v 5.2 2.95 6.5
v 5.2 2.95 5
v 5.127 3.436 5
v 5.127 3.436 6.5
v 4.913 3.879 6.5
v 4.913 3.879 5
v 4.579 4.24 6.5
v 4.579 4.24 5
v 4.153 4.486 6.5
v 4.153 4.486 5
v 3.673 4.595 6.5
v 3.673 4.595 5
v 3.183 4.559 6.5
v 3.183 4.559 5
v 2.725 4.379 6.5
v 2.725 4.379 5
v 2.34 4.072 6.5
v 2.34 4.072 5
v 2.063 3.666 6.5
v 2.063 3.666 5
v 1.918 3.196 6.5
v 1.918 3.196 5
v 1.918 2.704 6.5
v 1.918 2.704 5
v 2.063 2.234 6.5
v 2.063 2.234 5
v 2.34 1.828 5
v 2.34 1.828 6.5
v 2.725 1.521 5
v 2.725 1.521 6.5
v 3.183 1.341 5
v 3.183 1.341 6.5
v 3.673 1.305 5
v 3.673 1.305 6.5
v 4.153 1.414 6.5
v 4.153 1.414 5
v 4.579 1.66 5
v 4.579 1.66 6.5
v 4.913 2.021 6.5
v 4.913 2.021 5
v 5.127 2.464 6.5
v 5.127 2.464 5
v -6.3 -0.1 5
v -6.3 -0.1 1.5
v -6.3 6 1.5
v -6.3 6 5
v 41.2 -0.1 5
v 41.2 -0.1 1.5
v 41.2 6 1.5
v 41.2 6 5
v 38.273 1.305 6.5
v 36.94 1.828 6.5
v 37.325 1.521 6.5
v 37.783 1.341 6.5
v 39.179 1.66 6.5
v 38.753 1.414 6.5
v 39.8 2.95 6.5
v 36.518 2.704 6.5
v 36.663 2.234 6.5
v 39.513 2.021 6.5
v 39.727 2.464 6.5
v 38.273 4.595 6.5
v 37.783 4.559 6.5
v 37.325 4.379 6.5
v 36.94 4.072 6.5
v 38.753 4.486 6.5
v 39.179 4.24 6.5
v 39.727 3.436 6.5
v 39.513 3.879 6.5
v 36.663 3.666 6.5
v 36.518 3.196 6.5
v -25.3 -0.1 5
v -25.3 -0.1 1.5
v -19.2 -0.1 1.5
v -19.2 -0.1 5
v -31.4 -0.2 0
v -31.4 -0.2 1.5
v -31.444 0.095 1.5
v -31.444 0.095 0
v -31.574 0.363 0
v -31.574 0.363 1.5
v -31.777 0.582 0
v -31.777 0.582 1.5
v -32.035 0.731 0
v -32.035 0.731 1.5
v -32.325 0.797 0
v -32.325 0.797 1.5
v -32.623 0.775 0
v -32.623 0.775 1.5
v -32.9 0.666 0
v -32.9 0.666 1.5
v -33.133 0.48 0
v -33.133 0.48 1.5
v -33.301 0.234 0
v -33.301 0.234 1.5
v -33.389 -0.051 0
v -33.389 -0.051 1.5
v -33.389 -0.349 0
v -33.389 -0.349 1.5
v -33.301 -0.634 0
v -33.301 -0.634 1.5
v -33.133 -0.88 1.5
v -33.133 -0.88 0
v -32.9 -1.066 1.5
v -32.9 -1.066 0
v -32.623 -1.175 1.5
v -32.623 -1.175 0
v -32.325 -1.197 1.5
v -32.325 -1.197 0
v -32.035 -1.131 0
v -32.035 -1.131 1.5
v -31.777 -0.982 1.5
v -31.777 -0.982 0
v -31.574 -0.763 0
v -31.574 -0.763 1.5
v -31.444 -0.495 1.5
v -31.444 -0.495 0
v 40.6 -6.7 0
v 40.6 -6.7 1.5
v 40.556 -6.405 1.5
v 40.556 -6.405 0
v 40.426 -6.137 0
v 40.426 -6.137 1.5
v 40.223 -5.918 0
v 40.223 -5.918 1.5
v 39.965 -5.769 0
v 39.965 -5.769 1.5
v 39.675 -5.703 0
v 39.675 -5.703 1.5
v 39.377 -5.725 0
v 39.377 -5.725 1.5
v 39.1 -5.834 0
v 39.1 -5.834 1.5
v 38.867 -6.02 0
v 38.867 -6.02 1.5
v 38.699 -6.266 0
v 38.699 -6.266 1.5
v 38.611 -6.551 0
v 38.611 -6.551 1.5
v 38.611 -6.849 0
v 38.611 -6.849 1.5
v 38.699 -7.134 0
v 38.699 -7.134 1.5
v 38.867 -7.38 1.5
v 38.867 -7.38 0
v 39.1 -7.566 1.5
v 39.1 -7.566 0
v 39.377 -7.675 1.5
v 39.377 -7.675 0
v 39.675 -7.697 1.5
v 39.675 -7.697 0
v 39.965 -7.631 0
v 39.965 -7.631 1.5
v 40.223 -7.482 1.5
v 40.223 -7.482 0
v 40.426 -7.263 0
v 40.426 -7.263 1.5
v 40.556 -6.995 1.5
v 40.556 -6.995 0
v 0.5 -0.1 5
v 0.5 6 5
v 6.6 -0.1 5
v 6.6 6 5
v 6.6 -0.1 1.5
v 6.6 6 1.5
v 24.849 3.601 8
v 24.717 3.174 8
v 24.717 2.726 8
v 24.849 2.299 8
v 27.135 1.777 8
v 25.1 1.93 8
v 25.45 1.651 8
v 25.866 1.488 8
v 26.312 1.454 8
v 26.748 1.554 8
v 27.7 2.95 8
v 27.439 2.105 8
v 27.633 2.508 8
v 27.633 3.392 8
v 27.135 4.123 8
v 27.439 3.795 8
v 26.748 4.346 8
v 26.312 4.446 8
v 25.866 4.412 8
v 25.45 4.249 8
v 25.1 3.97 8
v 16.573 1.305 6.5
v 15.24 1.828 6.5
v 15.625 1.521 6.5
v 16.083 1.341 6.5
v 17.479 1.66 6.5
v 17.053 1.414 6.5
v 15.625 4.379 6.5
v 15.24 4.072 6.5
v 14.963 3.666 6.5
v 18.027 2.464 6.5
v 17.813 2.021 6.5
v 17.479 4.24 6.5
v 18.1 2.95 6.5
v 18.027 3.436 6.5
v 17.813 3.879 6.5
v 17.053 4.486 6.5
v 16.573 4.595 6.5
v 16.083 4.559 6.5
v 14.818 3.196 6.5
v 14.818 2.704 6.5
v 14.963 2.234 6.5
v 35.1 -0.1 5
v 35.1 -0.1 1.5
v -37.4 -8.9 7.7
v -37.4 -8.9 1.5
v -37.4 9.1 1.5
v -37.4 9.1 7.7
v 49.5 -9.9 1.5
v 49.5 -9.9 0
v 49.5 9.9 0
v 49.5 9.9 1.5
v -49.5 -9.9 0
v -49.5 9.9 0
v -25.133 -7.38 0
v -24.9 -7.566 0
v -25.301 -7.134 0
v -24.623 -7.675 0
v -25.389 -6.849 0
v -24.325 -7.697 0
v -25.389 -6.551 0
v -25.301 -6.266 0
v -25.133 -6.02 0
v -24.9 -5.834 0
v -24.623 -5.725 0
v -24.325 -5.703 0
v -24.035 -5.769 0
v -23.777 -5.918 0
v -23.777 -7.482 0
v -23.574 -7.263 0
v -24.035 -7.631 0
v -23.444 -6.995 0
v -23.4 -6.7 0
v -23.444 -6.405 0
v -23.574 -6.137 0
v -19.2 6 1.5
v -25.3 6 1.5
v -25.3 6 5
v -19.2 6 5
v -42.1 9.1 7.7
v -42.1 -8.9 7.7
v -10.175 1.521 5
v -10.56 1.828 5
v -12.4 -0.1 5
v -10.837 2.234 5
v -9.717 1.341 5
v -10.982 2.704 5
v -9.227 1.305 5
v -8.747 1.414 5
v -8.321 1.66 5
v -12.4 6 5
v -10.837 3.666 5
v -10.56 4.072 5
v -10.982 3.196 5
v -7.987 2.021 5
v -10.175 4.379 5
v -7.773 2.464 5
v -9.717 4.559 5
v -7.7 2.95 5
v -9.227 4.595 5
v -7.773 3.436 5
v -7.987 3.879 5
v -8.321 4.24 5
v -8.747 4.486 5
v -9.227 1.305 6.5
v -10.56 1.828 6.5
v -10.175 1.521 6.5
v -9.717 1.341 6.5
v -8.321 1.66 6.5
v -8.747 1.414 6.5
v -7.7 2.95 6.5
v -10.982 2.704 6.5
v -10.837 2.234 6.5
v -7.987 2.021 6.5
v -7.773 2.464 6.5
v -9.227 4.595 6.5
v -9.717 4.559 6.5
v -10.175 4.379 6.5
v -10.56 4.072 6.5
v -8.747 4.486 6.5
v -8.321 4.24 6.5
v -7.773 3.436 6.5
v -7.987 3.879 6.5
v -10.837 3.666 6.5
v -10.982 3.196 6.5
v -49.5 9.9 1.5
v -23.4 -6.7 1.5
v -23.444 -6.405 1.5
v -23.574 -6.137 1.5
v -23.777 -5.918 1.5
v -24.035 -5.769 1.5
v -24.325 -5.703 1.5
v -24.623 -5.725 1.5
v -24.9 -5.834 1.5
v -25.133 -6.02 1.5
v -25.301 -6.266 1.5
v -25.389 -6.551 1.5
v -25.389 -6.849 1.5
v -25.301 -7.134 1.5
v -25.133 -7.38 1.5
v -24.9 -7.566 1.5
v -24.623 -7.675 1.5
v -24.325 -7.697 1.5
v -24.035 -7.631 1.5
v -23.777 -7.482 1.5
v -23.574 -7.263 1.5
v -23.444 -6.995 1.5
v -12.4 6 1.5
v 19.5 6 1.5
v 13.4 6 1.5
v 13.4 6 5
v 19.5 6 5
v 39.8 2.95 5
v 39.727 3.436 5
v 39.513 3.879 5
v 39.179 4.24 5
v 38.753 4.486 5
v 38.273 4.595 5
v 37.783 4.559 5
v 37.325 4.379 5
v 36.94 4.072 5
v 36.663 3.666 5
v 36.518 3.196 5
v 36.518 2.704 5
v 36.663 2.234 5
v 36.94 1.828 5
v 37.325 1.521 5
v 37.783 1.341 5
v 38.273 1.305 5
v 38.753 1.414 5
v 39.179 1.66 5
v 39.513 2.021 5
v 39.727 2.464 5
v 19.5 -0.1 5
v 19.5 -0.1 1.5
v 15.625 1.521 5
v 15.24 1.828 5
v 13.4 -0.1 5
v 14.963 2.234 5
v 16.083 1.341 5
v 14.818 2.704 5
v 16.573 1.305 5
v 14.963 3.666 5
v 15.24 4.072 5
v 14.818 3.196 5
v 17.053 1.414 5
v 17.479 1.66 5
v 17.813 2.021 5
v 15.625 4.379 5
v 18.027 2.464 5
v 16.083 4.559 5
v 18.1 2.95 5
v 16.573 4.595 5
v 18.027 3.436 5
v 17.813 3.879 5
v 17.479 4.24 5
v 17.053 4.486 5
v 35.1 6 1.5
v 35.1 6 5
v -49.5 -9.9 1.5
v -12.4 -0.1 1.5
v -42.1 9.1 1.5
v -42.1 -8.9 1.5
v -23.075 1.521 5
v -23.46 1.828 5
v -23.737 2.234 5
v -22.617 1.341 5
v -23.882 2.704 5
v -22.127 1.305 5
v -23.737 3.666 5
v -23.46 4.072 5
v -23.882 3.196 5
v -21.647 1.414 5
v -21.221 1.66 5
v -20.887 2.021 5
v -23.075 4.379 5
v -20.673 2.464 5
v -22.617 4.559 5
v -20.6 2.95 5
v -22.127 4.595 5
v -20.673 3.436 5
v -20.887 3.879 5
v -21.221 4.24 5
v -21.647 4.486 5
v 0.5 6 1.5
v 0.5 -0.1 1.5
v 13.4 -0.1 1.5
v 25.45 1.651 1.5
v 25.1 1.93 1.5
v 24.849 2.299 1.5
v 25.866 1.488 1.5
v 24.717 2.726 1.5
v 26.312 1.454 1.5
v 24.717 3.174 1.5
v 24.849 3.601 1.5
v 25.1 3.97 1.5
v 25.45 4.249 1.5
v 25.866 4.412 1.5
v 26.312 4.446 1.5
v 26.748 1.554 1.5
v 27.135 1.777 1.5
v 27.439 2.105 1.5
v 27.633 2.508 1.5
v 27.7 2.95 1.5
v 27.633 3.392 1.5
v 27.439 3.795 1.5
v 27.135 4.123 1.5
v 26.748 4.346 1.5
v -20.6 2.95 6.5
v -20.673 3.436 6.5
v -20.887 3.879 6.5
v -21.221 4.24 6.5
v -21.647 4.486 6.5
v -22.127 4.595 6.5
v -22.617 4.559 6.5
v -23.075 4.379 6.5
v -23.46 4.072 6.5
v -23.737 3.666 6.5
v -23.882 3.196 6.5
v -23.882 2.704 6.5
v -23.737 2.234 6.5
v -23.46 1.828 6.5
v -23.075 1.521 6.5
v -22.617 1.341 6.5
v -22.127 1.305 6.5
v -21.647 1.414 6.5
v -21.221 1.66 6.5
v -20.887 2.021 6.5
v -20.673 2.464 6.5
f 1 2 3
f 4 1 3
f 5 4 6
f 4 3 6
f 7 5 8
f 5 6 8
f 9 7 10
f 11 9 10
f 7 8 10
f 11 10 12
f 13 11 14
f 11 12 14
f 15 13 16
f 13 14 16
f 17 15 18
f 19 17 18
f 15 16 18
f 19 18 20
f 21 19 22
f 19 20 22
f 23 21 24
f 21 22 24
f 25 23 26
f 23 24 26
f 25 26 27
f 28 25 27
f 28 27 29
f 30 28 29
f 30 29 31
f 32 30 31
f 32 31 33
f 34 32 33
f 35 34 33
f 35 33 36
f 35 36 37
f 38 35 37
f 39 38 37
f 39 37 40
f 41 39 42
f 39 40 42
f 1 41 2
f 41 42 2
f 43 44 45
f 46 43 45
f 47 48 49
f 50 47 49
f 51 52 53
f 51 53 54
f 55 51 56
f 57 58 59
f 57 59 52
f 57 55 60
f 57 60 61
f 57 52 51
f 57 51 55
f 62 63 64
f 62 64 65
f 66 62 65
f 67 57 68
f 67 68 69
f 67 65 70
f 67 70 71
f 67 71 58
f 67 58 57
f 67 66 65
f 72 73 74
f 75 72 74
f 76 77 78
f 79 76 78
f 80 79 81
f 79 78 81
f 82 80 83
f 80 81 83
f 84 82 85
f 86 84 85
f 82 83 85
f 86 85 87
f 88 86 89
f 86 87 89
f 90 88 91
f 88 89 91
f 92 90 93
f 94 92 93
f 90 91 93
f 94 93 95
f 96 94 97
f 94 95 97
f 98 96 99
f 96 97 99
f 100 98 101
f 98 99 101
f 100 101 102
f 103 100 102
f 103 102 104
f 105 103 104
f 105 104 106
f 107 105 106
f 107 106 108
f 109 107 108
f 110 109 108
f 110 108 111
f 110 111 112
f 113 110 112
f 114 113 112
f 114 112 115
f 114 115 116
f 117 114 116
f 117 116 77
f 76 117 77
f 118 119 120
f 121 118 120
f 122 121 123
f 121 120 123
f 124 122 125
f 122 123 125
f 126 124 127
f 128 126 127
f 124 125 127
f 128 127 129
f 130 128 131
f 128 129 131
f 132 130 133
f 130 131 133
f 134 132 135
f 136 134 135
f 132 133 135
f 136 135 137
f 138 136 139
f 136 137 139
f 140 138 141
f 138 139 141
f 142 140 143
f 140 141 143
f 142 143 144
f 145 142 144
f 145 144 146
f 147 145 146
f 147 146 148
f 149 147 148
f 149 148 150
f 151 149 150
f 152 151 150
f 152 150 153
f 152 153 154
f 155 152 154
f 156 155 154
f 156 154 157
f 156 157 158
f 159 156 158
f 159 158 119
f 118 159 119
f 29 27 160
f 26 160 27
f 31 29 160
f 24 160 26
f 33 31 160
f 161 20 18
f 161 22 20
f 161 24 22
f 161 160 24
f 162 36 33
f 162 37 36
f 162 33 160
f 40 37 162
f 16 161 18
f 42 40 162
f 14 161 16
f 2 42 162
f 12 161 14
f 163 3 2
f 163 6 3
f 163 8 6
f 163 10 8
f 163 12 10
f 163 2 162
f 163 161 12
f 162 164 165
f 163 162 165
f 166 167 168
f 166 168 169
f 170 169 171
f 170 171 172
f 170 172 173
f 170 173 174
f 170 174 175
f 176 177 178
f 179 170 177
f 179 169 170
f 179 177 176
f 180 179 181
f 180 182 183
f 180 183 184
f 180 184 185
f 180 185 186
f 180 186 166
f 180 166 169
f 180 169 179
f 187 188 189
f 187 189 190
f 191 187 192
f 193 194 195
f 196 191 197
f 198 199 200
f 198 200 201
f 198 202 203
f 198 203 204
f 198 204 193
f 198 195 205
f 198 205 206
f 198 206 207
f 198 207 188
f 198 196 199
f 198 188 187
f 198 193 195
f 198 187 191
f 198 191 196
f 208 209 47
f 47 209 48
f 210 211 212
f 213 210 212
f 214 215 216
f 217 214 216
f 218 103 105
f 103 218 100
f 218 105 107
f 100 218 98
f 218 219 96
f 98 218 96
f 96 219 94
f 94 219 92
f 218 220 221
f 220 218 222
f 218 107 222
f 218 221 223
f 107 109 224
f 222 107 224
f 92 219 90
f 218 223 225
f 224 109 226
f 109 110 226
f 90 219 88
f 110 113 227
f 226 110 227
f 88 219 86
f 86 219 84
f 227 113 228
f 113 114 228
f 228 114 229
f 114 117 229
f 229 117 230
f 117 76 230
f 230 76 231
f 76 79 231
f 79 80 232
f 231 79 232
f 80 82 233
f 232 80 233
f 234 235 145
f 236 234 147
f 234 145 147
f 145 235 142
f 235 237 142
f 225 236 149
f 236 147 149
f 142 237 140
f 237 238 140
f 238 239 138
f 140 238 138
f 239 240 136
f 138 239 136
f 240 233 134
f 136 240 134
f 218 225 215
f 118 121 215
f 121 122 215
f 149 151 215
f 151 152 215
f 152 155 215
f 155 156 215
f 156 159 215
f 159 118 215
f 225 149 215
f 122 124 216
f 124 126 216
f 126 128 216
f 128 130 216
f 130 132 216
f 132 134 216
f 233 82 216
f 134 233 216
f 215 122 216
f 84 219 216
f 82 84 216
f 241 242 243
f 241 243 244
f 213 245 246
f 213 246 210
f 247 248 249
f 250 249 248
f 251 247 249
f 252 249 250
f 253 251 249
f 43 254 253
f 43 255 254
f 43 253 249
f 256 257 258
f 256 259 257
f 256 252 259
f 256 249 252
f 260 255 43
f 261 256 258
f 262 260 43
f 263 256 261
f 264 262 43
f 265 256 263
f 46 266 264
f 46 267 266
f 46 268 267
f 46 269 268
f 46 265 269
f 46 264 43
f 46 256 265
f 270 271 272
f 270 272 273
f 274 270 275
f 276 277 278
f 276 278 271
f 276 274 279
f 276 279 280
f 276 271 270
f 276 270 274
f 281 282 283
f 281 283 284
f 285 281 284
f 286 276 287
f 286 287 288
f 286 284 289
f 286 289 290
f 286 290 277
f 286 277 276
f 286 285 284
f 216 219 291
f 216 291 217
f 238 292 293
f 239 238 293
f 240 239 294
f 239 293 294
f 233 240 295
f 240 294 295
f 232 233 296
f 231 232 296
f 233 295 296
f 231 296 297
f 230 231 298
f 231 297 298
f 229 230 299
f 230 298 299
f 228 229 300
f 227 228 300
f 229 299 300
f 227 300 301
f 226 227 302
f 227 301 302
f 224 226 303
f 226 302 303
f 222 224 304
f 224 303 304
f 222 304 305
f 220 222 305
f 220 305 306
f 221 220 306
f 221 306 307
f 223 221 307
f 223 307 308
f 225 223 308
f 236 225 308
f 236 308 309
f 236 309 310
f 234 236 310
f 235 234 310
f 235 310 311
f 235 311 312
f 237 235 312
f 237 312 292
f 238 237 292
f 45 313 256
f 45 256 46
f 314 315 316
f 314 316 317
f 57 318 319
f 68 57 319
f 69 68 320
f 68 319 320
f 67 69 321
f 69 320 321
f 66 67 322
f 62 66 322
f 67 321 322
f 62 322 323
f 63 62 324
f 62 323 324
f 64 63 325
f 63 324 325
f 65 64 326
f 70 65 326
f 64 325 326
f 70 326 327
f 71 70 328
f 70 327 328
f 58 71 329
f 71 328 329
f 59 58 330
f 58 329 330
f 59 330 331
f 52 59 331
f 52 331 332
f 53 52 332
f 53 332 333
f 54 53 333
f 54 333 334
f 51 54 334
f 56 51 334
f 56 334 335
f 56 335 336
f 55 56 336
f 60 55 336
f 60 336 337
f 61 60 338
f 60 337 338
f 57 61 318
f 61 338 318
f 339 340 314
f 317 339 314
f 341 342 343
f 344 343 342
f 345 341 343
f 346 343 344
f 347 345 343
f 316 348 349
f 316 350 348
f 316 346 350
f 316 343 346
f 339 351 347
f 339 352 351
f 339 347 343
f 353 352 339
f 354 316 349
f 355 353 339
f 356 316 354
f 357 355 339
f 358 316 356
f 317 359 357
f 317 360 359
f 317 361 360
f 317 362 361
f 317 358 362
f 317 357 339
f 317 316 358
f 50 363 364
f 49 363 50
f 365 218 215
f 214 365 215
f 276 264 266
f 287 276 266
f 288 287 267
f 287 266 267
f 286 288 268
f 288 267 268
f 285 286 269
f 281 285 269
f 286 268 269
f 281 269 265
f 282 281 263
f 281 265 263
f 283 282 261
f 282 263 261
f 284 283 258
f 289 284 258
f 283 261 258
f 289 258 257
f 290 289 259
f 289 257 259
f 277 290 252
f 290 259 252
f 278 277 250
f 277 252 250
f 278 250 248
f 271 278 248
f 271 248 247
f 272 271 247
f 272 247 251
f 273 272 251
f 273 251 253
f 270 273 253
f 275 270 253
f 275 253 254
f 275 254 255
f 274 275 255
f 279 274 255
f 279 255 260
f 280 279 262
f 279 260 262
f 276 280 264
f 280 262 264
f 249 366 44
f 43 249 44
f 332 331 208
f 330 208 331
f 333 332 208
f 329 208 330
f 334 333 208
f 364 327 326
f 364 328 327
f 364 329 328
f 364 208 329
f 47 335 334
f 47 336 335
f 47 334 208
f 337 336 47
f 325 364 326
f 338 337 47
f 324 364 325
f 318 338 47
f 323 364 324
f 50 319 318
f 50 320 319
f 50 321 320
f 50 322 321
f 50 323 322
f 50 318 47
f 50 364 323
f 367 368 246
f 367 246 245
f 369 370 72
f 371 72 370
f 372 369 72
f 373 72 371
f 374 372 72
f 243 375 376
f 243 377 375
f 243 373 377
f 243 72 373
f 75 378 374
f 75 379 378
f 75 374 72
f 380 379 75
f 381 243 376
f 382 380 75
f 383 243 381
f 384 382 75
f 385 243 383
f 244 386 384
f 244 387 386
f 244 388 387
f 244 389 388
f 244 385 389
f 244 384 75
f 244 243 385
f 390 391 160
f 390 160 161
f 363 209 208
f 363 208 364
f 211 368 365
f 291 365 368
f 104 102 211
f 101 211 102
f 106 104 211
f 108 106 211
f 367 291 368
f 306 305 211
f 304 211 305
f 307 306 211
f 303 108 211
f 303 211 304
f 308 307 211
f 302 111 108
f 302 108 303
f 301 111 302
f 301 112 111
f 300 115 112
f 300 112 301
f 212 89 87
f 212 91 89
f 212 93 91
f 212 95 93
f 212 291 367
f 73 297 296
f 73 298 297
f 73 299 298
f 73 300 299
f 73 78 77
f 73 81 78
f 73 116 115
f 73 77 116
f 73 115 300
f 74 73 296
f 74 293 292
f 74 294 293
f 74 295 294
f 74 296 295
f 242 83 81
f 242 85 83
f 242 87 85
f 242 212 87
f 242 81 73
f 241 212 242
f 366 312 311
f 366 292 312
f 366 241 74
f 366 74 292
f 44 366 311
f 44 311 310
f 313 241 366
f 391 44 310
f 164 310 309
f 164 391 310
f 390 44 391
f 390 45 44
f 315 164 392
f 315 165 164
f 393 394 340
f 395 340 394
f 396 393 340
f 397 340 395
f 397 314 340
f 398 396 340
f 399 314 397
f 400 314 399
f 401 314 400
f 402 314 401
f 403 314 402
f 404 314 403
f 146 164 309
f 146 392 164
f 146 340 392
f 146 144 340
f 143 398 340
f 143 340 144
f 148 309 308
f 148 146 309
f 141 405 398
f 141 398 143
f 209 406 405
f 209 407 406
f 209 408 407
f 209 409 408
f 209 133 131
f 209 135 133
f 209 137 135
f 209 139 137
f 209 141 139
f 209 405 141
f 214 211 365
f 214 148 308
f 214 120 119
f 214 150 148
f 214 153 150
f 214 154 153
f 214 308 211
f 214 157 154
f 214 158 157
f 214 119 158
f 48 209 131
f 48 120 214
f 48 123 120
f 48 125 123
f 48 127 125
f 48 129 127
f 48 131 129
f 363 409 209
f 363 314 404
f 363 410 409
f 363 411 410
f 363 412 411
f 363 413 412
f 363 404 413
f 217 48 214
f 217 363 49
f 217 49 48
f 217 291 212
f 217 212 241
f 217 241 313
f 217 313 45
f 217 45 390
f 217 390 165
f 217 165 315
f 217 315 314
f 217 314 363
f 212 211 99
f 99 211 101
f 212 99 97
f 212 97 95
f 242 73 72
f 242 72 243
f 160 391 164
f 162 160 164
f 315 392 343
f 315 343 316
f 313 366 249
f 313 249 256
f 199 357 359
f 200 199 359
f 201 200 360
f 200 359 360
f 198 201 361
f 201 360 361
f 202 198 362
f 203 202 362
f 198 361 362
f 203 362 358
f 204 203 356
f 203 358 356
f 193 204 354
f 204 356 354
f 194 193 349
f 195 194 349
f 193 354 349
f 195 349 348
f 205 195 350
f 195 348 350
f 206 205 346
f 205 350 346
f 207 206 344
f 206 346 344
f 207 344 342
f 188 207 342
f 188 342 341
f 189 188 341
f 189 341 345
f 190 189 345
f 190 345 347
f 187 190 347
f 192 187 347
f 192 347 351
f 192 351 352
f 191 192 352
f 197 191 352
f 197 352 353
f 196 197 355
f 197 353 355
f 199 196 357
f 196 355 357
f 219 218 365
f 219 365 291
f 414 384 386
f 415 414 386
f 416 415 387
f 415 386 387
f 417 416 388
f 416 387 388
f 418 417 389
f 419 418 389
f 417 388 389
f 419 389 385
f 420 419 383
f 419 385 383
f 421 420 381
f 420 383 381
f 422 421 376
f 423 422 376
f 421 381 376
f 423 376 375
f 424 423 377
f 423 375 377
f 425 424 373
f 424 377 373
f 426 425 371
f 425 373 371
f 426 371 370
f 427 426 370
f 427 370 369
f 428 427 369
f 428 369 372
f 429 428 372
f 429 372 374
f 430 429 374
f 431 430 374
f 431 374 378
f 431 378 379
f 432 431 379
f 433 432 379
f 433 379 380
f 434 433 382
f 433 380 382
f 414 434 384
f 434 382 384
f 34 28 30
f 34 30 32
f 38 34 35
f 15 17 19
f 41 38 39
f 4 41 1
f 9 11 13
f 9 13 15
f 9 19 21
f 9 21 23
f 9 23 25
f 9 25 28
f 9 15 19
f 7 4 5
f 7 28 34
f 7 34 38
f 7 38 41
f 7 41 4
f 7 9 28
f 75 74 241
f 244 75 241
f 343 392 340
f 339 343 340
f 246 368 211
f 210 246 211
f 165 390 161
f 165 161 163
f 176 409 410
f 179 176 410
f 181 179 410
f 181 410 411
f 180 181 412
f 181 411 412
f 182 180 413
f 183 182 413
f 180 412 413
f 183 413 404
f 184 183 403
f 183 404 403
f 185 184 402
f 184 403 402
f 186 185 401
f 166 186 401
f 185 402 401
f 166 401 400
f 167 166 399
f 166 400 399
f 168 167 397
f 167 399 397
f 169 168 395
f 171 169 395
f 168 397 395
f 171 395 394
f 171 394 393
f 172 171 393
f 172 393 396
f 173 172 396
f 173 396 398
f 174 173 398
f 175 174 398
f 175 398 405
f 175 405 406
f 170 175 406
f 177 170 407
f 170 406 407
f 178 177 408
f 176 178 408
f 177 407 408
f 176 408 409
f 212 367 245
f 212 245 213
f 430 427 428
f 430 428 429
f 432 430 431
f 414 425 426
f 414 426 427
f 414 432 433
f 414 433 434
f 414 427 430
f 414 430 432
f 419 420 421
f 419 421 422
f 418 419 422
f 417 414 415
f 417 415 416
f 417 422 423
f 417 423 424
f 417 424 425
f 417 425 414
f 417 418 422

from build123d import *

# Parameters (mm, degrees)
F0_W      = 99
F0_H      = 19.8
F1_DEPTH  = 1.5
F2_W      = 6.1
F2_H      = 6.1
F3_DEPTH  = 3.5
F4_R      = 1.65
F5_DEPTH  = 1.5
F6_R      = 1.5
F7_DEPTH  = 6.5
F8_W      = 4.7
F8_H      = 18
F9_DEPTH  = 6.2
F10_R     = 1
F11_DEPTH = 1.501


with BuildPart() as f1:
    # F0 (on Top) → F1 (new body)
    with BuildSketch(Plane.XY):
        Rectangle(F0_W, F0_H)
    extrude(amount=F1_DEPTH)

    # F2 (on face) → F3 (join)
    with BuildSketch(Plane.XY.offset(1.5)):
        with Locations((38.15, 2.95)):
            Rectangle(F2_W, F2_H)
        with Locations((16.45, 2.95)):
            Rectangle(F2_W, F2_H)
        with Locations((3.55, 2.95)):
            Rectangle(F2_W, F2_H)
        with Locations((-9.35, 2.95)):
            Rectangle(F2_W, F2_H)
        with Locations((-22.25, 2.95)):
            Rectangle(F2_W, F2_H)
    extrude(amount=F3_DEPTH)

    # F4 (on face) → F5 (join)
    with BuildSketch(Plane.XY.offset(5)):
        with Locations((-22.25, 2.95)):
            Circle(F4_R)
        with Locations((-9.35, 2.95)):
            Circle(F4_R)
        with Locations((3.55, 2.95)):
            Circle(F4_R)
        with Locations((16.45, 2.95)):
            Circle(F4_R)
        with Locations((38.15, 2.95)):
            Circle(F4_R)
    extrude(amount=F5_DEPTH)

    # F6 (on face) → F7 (join)
    with BuildSketch(Plane.XY.offset(1.5)):
        with Locations((26.2, 2.95)):
            Circle(F6_R)
    extrude(amount=F7_DEPTH)

    # F8 (on face) → F9 (join)
    with BuildSketch(Plane.XY.offset(1.5)):
        with Locations((-39.75, 0.1)):
            Rectangle(F8_W, F8_H)
    extrude(amount=F9_DEPTH)

    # F10 (on face) → F11 (cut, through all)
    with BuildSketch(Plane.XY.offset(1.5)):
        with Locations((-24.4, -6.7)):
            Circle(F10_R)
        with Locations((-32.4, -0.2)):
            Circle(F10_R)
        with Locations((39.6, -6.7)):
            Circle(F10_R)
    extrude(amount=-F11_DEPTH, mode=Mode.SUBTRACT)


solid = f1.part
